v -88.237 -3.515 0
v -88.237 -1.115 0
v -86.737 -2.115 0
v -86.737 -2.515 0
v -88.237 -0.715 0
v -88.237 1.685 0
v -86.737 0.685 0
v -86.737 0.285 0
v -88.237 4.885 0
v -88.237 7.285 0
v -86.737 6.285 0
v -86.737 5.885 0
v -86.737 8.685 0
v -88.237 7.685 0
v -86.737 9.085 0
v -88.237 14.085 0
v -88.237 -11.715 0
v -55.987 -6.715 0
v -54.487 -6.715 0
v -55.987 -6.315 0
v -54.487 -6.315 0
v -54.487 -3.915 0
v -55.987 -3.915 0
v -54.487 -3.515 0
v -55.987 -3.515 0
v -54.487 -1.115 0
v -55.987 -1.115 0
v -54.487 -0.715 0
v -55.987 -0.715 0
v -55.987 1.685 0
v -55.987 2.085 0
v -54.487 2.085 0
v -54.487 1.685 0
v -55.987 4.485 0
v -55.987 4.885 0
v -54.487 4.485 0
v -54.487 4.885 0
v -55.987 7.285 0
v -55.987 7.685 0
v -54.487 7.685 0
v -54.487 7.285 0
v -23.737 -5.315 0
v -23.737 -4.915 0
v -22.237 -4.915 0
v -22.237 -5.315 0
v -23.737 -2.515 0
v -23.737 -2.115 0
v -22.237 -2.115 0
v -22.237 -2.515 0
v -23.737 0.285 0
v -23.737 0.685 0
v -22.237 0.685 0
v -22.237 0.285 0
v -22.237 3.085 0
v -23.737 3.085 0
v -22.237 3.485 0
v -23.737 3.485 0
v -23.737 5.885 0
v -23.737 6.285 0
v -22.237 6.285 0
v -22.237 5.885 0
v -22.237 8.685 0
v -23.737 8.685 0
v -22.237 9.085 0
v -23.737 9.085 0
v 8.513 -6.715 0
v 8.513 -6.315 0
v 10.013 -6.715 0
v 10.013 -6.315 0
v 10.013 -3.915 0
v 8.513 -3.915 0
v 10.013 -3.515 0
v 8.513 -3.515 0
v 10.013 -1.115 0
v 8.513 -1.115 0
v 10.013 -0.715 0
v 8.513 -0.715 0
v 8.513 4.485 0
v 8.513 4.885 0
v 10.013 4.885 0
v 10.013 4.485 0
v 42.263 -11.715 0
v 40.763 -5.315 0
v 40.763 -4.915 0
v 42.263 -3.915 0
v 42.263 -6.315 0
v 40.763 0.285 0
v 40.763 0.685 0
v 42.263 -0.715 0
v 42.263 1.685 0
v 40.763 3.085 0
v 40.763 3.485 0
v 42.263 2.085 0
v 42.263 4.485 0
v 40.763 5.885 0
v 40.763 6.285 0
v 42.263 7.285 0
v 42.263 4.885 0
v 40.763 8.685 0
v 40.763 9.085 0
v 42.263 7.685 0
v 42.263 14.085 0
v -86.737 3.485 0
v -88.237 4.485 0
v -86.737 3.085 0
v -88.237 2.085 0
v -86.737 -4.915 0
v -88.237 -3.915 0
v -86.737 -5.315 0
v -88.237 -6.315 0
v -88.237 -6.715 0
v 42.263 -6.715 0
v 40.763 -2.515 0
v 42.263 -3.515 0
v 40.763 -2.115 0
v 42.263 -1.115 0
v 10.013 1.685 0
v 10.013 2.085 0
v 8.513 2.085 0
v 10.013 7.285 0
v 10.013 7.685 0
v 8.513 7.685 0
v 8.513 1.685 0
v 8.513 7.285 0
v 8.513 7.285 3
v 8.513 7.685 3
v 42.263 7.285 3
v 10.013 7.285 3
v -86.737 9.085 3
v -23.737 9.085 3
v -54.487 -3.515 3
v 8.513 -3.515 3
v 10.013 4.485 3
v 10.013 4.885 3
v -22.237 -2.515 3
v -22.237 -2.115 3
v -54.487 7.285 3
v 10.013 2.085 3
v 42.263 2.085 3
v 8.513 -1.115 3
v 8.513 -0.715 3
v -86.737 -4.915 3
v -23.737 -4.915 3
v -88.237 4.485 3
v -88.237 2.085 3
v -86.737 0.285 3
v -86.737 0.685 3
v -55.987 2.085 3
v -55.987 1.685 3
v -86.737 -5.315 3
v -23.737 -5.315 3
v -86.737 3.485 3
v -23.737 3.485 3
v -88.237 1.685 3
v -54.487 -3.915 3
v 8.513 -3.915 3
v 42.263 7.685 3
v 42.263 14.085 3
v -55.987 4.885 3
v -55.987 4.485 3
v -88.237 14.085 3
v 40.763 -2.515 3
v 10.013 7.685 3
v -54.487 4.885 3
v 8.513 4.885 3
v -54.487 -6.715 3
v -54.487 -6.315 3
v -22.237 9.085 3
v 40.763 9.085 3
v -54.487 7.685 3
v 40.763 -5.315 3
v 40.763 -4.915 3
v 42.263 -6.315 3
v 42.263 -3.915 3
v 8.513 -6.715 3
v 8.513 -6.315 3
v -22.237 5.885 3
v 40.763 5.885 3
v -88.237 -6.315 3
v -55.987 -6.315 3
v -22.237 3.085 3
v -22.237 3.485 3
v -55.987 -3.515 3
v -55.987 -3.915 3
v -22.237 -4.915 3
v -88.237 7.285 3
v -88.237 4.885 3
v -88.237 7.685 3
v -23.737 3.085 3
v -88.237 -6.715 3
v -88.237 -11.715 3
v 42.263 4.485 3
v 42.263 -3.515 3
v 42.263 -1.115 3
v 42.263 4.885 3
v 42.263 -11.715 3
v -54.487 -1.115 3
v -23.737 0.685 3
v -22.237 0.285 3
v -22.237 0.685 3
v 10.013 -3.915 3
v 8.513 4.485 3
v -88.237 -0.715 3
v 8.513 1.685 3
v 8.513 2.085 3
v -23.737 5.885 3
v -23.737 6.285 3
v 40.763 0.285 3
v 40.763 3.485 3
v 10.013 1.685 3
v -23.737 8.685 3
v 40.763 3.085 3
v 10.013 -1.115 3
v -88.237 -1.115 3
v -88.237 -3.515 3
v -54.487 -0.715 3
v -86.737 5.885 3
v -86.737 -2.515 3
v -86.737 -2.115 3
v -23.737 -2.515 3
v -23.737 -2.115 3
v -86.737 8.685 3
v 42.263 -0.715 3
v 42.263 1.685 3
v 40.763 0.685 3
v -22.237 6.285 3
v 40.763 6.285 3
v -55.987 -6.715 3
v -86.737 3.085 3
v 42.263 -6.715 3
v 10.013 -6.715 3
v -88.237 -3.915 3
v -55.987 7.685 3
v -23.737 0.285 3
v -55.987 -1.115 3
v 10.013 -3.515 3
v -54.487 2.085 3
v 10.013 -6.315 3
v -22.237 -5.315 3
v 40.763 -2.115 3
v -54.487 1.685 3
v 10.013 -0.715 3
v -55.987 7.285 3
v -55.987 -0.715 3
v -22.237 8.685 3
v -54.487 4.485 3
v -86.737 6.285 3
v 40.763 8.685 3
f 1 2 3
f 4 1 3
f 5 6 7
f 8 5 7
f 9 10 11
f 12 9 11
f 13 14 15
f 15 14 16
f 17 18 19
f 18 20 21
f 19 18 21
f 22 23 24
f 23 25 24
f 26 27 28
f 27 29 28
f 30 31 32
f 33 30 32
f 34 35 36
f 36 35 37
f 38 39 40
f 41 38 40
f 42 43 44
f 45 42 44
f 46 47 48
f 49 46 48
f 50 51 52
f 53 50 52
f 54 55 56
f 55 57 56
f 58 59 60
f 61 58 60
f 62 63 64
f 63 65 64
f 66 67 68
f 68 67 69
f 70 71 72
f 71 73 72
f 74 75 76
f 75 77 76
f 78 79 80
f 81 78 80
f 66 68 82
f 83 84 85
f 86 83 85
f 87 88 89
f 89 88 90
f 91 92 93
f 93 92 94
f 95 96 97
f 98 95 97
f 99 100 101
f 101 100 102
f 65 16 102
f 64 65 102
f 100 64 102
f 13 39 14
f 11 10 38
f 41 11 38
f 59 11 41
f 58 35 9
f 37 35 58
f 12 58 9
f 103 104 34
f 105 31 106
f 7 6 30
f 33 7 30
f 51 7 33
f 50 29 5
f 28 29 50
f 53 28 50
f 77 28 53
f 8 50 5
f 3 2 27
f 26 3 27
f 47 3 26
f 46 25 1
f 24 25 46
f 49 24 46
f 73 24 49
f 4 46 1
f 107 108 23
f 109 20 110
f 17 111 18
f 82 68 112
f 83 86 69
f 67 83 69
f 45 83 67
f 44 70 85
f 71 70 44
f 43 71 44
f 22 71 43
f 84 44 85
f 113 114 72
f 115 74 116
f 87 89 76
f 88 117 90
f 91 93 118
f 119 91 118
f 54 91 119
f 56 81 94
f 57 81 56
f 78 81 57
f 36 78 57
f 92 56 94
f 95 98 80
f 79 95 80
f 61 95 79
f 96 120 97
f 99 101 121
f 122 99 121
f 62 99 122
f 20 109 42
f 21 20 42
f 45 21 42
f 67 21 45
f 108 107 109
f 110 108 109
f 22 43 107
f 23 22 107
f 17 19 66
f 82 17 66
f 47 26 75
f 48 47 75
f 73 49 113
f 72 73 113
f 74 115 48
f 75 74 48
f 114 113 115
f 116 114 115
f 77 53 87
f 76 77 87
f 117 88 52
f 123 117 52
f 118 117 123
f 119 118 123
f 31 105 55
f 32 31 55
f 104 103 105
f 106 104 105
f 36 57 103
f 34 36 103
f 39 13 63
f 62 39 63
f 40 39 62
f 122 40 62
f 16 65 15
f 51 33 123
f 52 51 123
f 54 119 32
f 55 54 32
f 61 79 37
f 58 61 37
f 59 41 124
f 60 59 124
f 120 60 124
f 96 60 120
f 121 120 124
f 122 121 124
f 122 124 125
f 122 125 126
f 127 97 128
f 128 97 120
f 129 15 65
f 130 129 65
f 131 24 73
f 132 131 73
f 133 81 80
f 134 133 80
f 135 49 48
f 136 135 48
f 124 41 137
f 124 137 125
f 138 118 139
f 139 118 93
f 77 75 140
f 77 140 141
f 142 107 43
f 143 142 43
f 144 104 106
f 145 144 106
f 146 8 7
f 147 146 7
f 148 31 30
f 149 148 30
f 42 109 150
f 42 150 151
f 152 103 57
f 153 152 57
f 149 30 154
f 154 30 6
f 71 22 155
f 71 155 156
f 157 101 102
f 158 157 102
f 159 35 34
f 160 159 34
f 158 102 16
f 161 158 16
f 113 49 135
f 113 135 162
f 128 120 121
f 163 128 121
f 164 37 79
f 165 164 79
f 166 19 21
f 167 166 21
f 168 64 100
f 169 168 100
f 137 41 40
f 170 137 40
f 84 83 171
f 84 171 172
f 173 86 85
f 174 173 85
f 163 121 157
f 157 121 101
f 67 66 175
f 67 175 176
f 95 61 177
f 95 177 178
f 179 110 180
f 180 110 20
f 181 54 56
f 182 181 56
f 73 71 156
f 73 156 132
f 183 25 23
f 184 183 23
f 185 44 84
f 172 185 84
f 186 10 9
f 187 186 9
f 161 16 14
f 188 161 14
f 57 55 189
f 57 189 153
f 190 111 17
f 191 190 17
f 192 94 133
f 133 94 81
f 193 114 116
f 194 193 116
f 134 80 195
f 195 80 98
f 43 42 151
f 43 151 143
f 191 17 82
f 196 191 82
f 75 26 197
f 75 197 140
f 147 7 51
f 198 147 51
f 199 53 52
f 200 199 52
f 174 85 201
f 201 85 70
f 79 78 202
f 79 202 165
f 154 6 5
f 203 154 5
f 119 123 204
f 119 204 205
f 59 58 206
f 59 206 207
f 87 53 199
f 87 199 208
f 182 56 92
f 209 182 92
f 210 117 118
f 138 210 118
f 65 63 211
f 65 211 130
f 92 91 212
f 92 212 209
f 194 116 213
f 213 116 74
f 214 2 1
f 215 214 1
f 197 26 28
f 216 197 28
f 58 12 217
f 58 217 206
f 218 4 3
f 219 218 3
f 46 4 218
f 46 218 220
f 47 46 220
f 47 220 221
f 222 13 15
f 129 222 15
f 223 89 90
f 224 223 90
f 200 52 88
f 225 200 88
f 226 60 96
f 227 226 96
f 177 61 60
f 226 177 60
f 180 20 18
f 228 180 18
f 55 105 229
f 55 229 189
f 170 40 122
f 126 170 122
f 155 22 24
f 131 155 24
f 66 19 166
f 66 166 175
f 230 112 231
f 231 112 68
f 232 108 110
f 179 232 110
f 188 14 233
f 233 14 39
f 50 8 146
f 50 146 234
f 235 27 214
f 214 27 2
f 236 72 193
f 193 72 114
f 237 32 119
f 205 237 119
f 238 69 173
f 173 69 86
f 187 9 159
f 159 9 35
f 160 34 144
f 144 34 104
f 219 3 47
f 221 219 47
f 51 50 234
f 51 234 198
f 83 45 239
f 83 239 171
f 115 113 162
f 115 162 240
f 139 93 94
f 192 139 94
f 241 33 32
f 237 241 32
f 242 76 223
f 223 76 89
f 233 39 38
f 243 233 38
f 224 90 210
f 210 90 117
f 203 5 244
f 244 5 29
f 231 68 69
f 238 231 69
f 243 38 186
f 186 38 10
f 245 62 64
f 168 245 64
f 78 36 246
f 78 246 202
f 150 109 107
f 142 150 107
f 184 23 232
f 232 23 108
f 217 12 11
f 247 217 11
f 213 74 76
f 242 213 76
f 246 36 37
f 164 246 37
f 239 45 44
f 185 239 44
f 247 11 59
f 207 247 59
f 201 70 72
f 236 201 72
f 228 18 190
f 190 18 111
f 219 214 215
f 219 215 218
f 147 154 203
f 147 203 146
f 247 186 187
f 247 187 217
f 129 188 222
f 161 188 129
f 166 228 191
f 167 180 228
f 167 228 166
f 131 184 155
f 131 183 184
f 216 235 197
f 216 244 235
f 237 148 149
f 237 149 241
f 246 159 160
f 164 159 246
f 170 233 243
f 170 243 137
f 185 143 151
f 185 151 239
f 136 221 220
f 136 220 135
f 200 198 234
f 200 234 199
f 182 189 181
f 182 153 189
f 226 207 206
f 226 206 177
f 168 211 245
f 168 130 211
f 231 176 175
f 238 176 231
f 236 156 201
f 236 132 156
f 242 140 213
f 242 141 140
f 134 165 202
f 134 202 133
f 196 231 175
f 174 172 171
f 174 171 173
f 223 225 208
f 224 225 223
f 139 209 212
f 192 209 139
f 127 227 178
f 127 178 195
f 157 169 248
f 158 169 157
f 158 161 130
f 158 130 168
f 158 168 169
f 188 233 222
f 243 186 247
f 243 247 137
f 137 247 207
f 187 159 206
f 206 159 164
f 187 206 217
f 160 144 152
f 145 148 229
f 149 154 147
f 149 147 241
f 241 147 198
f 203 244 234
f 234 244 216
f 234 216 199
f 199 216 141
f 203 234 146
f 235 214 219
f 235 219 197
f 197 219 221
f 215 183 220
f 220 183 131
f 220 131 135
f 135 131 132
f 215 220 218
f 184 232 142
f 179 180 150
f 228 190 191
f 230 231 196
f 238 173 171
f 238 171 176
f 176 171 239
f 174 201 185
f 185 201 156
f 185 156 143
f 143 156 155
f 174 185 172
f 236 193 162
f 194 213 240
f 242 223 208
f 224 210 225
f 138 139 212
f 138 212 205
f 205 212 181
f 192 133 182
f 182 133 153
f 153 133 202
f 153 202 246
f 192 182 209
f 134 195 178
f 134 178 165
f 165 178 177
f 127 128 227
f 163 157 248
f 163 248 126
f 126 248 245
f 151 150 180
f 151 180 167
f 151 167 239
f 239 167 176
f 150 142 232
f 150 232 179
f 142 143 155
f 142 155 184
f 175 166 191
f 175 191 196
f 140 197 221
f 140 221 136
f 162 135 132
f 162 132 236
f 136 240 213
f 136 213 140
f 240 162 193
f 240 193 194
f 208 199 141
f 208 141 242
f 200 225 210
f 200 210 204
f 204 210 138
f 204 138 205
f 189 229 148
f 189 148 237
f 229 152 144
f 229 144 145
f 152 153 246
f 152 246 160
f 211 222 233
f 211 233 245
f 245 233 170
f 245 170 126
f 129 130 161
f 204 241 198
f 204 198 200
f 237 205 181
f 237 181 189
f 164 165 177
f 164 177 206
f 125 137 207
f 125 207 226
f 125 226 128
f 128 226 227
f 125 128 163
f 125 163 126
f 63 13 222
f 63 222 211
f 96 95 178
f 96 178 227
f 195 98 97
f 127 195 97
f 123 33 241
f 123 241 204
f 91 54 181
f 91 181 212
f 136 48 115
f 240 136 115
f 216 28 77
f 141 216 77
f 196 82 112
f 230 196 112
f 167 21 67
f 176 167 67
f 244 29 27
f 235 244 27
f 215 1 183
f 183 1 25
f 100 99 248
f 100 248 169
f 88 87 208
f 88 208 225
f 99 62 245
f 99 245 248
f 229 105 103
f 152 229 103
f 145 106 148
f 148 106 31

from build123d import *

# Parameters (mm, degrees)
F0_W     = 63
F0_H     = 0.4
F1_DEPTH = 3


with BuildPart() as f1:
    # F0 (on Top) → F1 (new body)
    with BuildSketch(Plane.XY):
        Polygon((42.2626923621, 7.6849870265), (42.2626923621, 14.0849870265), (-88.2373076379, 14.0849870265), (-88.2373076379, 7.6849870265), (-55.9873076379, 7.6849870265), (-55.9873076379, 7.2849870265), (-88.2373076379, 7.2849870265), (-88.2373076379, 4.8849870265), (-55.9873076379, 4.8849870265), (-55.9873076379, 4.4849870265), (-88.2373076379, 4.4849870265), (-88.2373076379, 2.0849870265), (-55.9873076379, 2.0849870265), (-55.9873076379, 1.6849870265), (-88.2373076379, 1.6849870265), (-88.2373076379, -0.7150129735), (-55.9873076379, -0.7150129735), (-55.9873076379, -1.1150129735), (-88.2373076379, -1.1150129735), (-88.2373076379, -3.5150129735), (-55.9873076379, -3.5150129735), (-55.9873076379, -3.9150129735), (-88.2373076379, -3.9150129735), (-88.2373076379, -6.3150129735), (-55.9873076379, -6.3150129735), (-55.9873076379, -6.7150129735), (-88.2373076379, -6.7150129735), (-88.2373076379, -11.7150129735), (42.2626923621, -11.7150129735), (42.2626923621, -6.7150129735), (10.0126923621, -6.7150129735), (10.0126923621, -6.3150129735), (42.2626923621, -6.3150129735), (42.2626923621, -3.9150129735), (10.0126923621, -3.9150129735), (10.0126923621, -3.5150129735), (42.2626923621, -3.5150129735), (42.2626923621, -1.1150129735), (10.0126923621, -1.1150129735), (10.0126923621, -0.7150129735), (42.2626923621, -0.7150129735), (42.2626923621, 1.6849870265), (10.0126923621, 1.6849870265), (10.0126923621, 2.0849870265), (42.2626923621, 2.0849870265), (42.2626923621, 4.4849870265), (10.0126923621, 4.4849870265), (10.0126923621, 4.8849870265), (42.2626923621, 4.8849870265), (42.2626923621, 7.2849870265), (10.0126923621, 7.2849870265), (10.0126923621, 7.6849870265), align=None)
        with Locations((-55.2373076379, -5.1150129735)):
            Rectangle(F0_W, F0_H, mode=Mode.SUBTRACT)
        with Locations((-55.2373076379, -2.3150129735)):
            Rectangle(F0_W, F0_H, mode=Mode.SUBTRACT)
        with Locations((-55.2373076379, 0.4849870265)):
            Rectangle(F0_W, F0_H, mode=Mode.SUBTRACT)
        with Locations((-22.9873076379, -6.5150129735)):
            Rectangle(F0_W, F0_H, mode=Mode.SUBTRACT)
        with Locations((-22.9873076379, -3.7150129735)):
            Rectangle(F0_W, F0_H, mode=Mode.SUBTRACT)
        with Locations((9.2626923621, -5.1150129735)):
            Rectangle(F0_W, F0_H, mode=Mode.SUBTRACT)
        with Locations((9.2626923621, -2.3150129735)):
            Rectangle(F0_W, F0_H, mode=Mode.SUBTRACT)
        with Locations((-22.9873076379, -0.9150129735)):
            Rectangle(F0_W, F0_H, mode=Mode.SUBTRACT)
        with Locations((9.2626923621, 0.4849870265)):
            Rectangle(F0_W, F0_H, mode=Mode.SUBTRACT)
        with Locations((-55.2373076379, 3.2849870265)):
            Rectangle(F0_W, F0_H, mode=Mode.SUBTRACT)
        with Locations((-55.2373076379, 6.0849870265)):
            Rectangle(F0_W, F0_H, mode=Mode.SUBTRACT)
        with Locations((-55.2373076379, 8.8849870265)):
            Rectangle(F0_W, F0_H, mode=Mode.SUBTRACT)
        with Locations((-22.9873076379, 1.8849870265)):
            Rectangle(F0_W, F0_H, mode=Mode.SUBTRACT)
        with Locations((9.2626923621, 3.2849870265)):
            Rectangle(F0_W, F0_H, mode=Mode.SUBTRACT)
        with Locations((-22.9873076379, 4.6849870265)):
            Rectangle(F0_W, F0_H, mode=Mode.SUBTRACT)
        with Locations((-22.9873076379, 7.4849870265)):
            Rectangle(F0_W, F0_H, mode=Mode.SUBTRACT)
        with Locations((9.2626923621, 6.0849870265)):
            Rectangle(F0_W, F0_H, mode=Mode.SUBTRACT)
        with Locations((9.2626923621, 8.8849870265)):
            Rectangle(F0_W, F0_H, mode=Mode.SUBTRACT)
    extrude(amount=F1_DEPTH)


solid = f1.part
